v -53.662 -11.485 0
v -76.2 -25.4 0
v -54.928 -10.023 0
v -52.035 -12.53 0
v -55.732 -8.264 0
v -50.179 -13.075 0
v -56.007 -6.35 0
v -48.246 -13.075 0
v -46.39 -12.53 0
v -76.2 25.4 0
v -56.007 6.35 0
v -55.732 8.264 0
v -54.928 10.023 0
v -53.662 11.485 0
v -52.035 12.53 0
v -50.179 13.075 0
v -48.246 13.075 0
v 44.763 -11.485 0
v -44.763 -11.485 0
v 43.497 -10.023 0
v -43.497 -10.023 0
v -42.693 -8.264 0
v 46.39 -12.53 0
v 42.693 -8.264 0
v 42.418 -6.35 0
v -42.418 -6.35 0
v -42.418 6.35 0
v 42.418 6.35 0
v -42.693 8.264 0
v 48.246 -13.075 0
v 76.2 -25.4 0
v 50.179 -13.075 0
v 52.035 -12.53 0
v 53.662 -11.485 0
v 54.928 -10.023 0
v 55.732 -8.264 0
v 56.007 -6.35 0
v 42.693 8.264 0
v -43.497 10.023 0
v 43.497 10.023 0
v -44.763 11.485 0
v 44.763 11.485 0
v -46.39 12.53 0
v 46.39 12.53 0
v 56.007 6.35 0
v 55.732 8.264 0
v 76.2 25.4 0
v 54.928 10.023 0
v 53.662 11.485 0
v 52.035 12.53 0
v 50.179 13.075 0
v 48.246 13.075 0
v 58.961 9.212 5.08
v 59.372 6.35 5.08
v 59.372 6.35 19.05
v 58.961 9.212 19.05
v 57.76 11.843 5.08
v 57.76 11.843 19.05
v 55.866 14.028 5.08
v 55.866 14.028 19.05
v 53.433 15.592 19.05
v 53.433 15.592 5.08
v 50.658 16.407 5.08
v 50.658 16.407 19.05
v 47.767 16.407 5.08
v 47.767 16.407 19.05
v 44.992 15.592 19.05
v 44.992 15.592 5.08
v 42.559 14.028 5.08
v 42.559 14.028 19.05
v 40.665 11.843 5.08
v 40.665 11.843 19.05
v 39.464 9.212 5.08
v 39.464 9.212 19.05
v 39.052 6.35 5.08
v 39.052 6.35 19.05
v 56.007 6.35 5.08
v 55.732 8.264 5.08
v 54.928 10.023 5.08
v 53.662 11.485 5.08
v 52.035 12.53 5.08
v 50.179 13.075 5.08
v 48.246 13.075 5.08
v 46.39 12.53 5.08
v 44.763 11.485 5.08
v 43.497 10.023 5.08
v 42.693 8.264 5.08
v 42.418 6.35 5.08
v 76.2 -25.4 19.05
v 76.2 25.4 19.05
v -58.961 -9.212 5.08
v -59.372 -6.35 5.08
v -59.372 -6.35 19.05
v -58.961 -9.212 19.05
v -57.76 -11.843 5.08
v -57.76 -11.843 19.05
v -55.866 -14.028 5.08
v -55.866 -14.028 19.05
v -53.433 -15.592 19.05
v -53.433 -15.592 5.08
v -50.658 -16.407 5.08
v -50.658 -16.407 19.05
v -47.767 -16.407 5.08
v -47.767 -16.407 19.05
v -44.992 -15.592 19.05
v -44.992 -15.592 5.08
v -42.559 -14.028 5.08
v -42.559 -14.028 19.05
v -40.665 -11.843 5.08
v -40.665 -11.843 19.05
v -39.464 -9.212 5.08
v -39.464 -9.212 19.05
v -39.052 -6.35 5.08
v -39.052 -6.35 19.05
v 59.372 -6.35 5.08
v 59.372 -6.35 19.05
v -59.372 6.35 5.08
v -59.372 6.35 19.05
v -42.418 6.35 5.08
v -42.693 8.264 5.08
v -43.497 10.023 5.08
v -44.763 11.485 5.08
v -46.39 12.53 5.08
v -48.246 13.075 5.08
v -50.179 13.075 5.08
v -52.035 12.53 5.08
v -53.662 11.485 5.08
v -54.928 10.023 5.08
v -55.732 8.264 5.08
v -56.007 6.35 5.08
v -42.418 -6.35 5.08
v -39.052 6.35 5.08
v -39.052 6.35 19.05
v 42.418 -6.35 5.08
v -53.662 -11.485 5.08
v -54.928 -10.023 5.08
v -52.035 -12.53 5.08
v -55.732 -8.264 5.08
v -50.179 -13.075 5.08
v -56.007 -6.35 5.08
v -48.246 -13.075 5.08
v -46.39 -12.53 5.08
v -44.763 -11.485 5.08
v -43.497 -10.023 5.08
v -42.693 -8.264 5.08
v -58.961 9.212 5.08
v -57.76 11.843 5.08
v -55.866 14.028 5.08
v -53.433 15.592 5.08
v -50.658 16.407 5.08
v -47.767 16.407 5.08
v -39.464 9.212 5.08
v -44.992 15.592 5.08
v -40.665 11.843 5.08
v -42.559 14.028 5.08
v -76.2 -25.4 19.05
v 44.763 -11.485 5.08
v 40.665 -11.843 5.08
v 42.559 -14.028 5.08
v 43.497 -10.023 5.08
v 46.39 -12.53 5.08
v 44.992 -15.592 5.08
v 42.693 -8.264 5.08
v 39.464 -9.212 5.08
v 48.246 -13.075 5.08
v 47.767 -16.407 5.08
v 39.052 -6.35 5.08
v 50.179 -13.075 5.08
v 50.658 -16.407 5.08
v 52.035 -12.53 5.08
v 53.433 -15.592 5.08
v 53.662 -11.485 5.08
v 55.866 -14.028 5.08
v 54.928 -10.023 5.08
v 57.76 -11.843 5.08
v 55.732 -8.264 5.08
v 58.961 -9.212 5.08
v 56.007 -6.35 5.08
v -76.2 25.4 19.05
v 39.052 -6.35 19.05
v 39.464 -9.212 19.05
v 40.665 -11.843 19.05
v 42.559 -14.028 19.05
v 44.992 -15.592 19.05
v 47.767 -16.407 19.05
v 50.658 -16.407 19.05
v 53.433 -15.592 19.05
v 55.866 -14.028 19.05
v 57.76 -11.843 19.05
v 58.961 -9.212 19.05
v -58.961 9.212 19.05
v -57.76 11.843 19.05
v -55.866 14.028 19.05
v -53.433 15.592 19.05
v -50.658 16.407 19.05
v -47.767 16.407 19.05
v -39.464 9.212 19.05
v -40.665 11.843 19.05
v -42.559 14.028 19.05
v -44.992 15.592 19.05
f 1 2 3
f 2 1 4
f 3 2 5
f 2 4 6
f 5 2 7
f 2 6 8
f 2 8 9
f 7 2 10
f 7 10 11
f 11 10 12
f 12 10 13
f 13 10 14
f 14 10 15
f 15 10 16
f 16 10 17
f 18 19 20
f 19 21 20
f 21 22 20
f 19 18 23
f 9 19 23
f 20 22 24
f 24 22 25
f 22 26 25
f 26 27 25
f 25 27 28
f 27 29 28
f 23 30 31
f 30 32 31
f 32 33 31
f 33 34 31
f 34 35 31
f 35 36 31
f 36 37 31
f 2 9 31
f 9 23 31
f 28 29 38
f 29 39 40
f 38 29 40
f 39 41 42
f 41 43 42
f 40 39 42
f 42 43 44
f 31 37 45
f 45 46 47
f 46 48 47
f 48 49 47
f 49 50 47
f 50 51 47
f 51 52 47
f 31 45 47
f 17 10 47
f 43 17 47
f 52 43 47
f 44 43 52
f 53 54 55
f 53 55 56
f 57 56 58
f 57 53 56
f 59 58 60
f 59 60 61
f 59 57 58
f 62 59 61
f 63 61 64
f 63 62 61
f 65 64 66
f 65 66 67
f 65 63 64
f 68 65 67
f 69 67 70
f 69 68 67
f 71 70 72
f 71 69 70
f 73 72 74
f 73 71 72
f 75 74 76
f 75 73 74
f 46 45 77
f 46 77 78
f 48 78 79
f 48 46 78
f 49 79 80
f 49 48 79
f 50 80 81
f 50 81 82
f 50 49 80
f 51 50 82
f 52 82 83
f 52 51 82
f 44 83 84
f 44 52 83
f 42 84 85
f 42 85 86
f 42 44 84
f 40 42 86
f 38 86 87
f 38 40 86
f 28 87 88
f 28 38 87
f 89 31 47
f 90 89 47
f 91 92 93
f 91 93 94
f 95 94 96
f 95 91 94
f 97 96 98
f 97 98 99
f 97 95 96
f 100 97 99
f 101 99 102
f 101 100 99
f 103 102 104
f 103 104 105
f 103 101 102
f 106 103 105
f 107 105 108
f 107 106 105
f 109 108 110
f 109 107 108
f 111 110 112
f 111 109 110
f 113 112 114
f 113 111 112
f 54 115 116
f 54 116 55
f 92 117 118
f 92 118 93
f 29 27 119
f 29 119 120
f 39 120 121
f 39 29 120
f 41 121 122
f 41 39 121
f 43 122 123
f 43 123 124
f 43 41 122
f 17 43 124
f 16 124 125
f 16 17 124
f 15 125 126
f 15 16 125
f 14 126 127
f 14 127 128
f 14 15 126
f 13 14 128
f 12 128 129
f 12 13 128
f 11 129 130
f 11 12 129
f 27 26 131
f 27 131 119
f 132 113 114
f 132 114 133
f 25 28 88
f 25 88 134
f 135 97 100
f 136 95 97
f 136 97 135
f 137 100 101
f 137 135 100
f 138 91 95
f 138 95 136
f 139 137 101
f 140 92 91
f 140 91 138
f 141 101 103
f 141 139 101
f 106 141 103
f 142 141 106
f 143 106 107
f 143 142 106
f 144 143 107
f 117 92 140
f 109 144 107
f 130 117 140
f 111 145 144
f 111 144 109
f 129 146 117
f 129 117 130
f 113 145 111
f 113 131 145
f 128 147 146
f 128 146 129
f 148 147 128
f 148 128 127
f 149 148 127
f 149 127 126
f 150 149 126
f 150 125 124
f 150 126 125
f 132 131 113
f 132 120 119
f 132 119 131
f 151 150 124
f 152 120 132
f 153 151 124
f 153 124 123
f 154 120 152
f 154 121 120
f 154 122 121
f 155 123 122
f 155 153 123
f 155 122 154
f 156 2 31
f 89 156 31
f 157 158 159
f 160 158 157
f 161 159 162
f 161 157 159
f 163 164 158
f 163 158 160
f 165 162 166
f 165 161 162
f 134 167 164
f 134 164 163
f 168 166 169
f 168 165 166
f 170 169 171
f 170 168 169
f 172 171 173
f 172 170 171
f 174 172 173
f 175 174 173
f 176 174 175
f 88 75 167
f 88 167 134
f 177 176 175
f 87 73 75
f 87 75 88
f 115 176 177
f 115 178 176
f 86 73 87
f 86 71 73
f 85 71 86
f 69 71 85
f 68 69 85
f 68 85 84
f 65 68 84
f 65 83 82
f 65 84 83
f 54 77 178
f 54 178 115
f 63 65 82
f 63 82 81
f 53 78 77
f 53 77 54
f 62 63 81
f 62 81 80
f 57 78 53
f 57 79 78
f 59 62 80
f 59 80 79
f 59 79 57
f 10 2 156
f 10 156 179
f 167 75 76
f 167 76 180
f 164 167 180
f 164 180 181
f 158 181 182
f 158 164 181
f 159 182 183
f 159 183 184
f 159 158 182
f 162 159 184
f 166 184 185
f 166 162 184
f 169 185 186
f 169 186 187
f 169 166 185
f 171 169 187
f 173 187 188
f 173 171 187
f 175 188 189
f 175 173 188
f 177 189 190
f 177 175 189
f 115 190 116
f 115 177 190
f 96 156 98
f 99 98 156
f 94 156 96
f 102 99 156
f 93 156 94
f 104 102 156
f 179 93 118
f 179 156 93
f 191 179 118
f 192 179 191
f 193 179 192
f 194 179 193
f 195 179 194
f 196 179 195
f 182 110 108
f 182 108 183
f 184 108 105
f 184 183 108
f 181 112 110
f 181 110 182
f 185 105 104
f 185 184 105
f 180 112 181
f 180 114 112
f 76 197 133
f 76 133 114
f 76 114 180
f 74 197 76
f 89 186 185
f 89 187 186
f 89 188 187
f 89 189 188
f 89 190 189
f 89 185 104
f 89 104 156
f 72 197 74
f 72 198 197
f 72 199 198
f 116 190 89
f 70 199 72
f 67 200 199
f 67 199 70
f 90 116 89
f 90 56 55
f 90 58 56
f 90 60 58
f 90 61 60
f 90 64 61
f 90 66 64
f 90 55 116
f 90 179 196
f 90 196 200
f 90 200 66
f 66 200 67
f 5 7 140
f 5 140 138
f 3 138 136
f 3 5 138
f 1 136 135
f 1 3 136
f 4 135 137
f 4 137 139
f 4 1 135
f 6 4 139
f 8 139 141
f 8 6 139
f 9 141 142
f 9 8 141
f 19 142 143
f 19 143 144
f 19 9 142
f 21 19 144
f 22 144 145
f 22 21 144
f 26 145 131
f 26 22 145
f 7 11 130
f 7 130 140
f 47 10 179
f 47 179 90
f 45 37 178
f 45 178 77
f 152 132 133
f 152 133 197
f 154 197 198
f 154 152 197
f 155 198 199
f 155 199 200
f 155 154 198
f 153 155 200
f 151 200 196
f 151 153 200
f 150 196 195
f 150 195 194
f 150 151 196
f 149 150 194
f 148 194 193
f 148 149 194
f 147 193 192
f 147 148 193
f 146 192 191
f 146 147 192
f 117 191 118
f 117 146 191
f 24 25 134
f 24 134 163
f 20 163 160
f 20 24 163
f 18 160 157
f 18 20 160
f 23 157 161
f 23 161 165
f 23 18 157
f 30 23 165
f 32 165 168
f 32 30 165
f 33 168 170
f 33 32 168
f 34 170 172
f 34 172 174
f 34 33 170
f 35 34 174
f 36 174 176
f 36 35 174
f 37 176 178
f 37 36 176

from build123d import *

# Parameters (mm, degrees)
SKETCH1_W           = 152.4
SKETCH1_H           = 50.8
BOSS_EXTRUDE1_DEPTH = 19.05
BOSS_EXTRUDE2_DEPTH = 5.08


with BuildPart() as part:
    # Sketch1 → Boss-Extrude1 (new body)
    with BuildSketch(Plane.XY):
        Rectangle(SKETCH1_W, SKETCH1_H)
        with BuildLine():
            ThreePointArc((-39.0525, -6.35), (-49.2125, -16.51), (-59.3725, -6.35))
            Line((-59.3725, -6.35), (-59.3725, 6.35))
            ThreePointArc((-59.3725, 6.35), (-49.2125, 16.51), (-39.0525, 6.35))
            Line((-39.0525, 6.35), (-39.0525, -6.35))
        make_face(mode=Mode.SUBTRACT)
        with BuildLine():
            ThreePointArc((59.3725, -6.35), (49.2125, -16.51), (39.0525, -6.35))
            Line((39.0525, -6.35), (39.0525, 6.35))
            ThreePointArc((39.0525, 6.35), (49.2125, 16.51), (59.3725, 6.35))
            Line((59.3725, 6.35), (59.3725, -6.35))
        make_face(mode=Mode.SUBTRACT)
    extrude(amount=BOSS_EXTRUDE1_DEPTH)

    # Sketch1<3> → Boss-Extrude2 (add)
    # profile 1 of 2: a face of its own
    with BuildSketch(Plane.XY):
        with BuildLine():
            Line((-59.3725, 6.35), (-59.3725, -6.35))
            ThreePointArc((-59.3725, -6.35), (-49.2125, -16.51), (-39.0525, -6.35))
            Line((-39.0525, -6.35), (-39.0525, 6.35))
            ThreePointArc((-39.0525, 6.35), (-49.2125, 16.51), (-59.3725, 6.35))
        make_face()
        with BuildLine():
            ThreePointArc((-42.418, -6.35), (-49.2125, -13.1445), (-56.007, -6.35))
            Line((-56.007, -6.35), (-56.007, 6.35))
            ThreePointArc((-56.007, 6.35), (-49.2125, 13.1445), (-42.418, 6.35))
            Line((-42.418, 6.35), (-42.418, -6.35))
        make_face(mode=Mode.SUBTRACT)
    # profile 2 of 2: a face of its own
    with BuildSketch(Plane.XY):
        with BuildLine():
            Line((39.0525, 6.35), (39.0525, -6.35))
            ThreePointArc((39.0525, -6.35), (49.2125, -16.51), (59.3725, -6.35))
            Line((59.3725, -6.35), (59.3725, 6.35))
            ThreePointArc((59.3725, 6.35), (49.2125, 16.51), (39.0525, 6.35))
        make_face()
        with BuildLine():
            ThreePointArc((56.007, -6.35), (49.2125, -13.1445), (42.418, -6.35))
            Line((42.418, -6.35), (42.418, 6.35))
            ThreePointArc((42.418, 6.35), (49.2125, 13.1445), (56.007, 6.35))
            Line((56.007, 6.35), (56.007, -6.35))
        make_face(mode=Mode.SUBTRACT)
    extrude(amount=BOSS_EXTRUDE2_DEPTH)


solid = part.part
